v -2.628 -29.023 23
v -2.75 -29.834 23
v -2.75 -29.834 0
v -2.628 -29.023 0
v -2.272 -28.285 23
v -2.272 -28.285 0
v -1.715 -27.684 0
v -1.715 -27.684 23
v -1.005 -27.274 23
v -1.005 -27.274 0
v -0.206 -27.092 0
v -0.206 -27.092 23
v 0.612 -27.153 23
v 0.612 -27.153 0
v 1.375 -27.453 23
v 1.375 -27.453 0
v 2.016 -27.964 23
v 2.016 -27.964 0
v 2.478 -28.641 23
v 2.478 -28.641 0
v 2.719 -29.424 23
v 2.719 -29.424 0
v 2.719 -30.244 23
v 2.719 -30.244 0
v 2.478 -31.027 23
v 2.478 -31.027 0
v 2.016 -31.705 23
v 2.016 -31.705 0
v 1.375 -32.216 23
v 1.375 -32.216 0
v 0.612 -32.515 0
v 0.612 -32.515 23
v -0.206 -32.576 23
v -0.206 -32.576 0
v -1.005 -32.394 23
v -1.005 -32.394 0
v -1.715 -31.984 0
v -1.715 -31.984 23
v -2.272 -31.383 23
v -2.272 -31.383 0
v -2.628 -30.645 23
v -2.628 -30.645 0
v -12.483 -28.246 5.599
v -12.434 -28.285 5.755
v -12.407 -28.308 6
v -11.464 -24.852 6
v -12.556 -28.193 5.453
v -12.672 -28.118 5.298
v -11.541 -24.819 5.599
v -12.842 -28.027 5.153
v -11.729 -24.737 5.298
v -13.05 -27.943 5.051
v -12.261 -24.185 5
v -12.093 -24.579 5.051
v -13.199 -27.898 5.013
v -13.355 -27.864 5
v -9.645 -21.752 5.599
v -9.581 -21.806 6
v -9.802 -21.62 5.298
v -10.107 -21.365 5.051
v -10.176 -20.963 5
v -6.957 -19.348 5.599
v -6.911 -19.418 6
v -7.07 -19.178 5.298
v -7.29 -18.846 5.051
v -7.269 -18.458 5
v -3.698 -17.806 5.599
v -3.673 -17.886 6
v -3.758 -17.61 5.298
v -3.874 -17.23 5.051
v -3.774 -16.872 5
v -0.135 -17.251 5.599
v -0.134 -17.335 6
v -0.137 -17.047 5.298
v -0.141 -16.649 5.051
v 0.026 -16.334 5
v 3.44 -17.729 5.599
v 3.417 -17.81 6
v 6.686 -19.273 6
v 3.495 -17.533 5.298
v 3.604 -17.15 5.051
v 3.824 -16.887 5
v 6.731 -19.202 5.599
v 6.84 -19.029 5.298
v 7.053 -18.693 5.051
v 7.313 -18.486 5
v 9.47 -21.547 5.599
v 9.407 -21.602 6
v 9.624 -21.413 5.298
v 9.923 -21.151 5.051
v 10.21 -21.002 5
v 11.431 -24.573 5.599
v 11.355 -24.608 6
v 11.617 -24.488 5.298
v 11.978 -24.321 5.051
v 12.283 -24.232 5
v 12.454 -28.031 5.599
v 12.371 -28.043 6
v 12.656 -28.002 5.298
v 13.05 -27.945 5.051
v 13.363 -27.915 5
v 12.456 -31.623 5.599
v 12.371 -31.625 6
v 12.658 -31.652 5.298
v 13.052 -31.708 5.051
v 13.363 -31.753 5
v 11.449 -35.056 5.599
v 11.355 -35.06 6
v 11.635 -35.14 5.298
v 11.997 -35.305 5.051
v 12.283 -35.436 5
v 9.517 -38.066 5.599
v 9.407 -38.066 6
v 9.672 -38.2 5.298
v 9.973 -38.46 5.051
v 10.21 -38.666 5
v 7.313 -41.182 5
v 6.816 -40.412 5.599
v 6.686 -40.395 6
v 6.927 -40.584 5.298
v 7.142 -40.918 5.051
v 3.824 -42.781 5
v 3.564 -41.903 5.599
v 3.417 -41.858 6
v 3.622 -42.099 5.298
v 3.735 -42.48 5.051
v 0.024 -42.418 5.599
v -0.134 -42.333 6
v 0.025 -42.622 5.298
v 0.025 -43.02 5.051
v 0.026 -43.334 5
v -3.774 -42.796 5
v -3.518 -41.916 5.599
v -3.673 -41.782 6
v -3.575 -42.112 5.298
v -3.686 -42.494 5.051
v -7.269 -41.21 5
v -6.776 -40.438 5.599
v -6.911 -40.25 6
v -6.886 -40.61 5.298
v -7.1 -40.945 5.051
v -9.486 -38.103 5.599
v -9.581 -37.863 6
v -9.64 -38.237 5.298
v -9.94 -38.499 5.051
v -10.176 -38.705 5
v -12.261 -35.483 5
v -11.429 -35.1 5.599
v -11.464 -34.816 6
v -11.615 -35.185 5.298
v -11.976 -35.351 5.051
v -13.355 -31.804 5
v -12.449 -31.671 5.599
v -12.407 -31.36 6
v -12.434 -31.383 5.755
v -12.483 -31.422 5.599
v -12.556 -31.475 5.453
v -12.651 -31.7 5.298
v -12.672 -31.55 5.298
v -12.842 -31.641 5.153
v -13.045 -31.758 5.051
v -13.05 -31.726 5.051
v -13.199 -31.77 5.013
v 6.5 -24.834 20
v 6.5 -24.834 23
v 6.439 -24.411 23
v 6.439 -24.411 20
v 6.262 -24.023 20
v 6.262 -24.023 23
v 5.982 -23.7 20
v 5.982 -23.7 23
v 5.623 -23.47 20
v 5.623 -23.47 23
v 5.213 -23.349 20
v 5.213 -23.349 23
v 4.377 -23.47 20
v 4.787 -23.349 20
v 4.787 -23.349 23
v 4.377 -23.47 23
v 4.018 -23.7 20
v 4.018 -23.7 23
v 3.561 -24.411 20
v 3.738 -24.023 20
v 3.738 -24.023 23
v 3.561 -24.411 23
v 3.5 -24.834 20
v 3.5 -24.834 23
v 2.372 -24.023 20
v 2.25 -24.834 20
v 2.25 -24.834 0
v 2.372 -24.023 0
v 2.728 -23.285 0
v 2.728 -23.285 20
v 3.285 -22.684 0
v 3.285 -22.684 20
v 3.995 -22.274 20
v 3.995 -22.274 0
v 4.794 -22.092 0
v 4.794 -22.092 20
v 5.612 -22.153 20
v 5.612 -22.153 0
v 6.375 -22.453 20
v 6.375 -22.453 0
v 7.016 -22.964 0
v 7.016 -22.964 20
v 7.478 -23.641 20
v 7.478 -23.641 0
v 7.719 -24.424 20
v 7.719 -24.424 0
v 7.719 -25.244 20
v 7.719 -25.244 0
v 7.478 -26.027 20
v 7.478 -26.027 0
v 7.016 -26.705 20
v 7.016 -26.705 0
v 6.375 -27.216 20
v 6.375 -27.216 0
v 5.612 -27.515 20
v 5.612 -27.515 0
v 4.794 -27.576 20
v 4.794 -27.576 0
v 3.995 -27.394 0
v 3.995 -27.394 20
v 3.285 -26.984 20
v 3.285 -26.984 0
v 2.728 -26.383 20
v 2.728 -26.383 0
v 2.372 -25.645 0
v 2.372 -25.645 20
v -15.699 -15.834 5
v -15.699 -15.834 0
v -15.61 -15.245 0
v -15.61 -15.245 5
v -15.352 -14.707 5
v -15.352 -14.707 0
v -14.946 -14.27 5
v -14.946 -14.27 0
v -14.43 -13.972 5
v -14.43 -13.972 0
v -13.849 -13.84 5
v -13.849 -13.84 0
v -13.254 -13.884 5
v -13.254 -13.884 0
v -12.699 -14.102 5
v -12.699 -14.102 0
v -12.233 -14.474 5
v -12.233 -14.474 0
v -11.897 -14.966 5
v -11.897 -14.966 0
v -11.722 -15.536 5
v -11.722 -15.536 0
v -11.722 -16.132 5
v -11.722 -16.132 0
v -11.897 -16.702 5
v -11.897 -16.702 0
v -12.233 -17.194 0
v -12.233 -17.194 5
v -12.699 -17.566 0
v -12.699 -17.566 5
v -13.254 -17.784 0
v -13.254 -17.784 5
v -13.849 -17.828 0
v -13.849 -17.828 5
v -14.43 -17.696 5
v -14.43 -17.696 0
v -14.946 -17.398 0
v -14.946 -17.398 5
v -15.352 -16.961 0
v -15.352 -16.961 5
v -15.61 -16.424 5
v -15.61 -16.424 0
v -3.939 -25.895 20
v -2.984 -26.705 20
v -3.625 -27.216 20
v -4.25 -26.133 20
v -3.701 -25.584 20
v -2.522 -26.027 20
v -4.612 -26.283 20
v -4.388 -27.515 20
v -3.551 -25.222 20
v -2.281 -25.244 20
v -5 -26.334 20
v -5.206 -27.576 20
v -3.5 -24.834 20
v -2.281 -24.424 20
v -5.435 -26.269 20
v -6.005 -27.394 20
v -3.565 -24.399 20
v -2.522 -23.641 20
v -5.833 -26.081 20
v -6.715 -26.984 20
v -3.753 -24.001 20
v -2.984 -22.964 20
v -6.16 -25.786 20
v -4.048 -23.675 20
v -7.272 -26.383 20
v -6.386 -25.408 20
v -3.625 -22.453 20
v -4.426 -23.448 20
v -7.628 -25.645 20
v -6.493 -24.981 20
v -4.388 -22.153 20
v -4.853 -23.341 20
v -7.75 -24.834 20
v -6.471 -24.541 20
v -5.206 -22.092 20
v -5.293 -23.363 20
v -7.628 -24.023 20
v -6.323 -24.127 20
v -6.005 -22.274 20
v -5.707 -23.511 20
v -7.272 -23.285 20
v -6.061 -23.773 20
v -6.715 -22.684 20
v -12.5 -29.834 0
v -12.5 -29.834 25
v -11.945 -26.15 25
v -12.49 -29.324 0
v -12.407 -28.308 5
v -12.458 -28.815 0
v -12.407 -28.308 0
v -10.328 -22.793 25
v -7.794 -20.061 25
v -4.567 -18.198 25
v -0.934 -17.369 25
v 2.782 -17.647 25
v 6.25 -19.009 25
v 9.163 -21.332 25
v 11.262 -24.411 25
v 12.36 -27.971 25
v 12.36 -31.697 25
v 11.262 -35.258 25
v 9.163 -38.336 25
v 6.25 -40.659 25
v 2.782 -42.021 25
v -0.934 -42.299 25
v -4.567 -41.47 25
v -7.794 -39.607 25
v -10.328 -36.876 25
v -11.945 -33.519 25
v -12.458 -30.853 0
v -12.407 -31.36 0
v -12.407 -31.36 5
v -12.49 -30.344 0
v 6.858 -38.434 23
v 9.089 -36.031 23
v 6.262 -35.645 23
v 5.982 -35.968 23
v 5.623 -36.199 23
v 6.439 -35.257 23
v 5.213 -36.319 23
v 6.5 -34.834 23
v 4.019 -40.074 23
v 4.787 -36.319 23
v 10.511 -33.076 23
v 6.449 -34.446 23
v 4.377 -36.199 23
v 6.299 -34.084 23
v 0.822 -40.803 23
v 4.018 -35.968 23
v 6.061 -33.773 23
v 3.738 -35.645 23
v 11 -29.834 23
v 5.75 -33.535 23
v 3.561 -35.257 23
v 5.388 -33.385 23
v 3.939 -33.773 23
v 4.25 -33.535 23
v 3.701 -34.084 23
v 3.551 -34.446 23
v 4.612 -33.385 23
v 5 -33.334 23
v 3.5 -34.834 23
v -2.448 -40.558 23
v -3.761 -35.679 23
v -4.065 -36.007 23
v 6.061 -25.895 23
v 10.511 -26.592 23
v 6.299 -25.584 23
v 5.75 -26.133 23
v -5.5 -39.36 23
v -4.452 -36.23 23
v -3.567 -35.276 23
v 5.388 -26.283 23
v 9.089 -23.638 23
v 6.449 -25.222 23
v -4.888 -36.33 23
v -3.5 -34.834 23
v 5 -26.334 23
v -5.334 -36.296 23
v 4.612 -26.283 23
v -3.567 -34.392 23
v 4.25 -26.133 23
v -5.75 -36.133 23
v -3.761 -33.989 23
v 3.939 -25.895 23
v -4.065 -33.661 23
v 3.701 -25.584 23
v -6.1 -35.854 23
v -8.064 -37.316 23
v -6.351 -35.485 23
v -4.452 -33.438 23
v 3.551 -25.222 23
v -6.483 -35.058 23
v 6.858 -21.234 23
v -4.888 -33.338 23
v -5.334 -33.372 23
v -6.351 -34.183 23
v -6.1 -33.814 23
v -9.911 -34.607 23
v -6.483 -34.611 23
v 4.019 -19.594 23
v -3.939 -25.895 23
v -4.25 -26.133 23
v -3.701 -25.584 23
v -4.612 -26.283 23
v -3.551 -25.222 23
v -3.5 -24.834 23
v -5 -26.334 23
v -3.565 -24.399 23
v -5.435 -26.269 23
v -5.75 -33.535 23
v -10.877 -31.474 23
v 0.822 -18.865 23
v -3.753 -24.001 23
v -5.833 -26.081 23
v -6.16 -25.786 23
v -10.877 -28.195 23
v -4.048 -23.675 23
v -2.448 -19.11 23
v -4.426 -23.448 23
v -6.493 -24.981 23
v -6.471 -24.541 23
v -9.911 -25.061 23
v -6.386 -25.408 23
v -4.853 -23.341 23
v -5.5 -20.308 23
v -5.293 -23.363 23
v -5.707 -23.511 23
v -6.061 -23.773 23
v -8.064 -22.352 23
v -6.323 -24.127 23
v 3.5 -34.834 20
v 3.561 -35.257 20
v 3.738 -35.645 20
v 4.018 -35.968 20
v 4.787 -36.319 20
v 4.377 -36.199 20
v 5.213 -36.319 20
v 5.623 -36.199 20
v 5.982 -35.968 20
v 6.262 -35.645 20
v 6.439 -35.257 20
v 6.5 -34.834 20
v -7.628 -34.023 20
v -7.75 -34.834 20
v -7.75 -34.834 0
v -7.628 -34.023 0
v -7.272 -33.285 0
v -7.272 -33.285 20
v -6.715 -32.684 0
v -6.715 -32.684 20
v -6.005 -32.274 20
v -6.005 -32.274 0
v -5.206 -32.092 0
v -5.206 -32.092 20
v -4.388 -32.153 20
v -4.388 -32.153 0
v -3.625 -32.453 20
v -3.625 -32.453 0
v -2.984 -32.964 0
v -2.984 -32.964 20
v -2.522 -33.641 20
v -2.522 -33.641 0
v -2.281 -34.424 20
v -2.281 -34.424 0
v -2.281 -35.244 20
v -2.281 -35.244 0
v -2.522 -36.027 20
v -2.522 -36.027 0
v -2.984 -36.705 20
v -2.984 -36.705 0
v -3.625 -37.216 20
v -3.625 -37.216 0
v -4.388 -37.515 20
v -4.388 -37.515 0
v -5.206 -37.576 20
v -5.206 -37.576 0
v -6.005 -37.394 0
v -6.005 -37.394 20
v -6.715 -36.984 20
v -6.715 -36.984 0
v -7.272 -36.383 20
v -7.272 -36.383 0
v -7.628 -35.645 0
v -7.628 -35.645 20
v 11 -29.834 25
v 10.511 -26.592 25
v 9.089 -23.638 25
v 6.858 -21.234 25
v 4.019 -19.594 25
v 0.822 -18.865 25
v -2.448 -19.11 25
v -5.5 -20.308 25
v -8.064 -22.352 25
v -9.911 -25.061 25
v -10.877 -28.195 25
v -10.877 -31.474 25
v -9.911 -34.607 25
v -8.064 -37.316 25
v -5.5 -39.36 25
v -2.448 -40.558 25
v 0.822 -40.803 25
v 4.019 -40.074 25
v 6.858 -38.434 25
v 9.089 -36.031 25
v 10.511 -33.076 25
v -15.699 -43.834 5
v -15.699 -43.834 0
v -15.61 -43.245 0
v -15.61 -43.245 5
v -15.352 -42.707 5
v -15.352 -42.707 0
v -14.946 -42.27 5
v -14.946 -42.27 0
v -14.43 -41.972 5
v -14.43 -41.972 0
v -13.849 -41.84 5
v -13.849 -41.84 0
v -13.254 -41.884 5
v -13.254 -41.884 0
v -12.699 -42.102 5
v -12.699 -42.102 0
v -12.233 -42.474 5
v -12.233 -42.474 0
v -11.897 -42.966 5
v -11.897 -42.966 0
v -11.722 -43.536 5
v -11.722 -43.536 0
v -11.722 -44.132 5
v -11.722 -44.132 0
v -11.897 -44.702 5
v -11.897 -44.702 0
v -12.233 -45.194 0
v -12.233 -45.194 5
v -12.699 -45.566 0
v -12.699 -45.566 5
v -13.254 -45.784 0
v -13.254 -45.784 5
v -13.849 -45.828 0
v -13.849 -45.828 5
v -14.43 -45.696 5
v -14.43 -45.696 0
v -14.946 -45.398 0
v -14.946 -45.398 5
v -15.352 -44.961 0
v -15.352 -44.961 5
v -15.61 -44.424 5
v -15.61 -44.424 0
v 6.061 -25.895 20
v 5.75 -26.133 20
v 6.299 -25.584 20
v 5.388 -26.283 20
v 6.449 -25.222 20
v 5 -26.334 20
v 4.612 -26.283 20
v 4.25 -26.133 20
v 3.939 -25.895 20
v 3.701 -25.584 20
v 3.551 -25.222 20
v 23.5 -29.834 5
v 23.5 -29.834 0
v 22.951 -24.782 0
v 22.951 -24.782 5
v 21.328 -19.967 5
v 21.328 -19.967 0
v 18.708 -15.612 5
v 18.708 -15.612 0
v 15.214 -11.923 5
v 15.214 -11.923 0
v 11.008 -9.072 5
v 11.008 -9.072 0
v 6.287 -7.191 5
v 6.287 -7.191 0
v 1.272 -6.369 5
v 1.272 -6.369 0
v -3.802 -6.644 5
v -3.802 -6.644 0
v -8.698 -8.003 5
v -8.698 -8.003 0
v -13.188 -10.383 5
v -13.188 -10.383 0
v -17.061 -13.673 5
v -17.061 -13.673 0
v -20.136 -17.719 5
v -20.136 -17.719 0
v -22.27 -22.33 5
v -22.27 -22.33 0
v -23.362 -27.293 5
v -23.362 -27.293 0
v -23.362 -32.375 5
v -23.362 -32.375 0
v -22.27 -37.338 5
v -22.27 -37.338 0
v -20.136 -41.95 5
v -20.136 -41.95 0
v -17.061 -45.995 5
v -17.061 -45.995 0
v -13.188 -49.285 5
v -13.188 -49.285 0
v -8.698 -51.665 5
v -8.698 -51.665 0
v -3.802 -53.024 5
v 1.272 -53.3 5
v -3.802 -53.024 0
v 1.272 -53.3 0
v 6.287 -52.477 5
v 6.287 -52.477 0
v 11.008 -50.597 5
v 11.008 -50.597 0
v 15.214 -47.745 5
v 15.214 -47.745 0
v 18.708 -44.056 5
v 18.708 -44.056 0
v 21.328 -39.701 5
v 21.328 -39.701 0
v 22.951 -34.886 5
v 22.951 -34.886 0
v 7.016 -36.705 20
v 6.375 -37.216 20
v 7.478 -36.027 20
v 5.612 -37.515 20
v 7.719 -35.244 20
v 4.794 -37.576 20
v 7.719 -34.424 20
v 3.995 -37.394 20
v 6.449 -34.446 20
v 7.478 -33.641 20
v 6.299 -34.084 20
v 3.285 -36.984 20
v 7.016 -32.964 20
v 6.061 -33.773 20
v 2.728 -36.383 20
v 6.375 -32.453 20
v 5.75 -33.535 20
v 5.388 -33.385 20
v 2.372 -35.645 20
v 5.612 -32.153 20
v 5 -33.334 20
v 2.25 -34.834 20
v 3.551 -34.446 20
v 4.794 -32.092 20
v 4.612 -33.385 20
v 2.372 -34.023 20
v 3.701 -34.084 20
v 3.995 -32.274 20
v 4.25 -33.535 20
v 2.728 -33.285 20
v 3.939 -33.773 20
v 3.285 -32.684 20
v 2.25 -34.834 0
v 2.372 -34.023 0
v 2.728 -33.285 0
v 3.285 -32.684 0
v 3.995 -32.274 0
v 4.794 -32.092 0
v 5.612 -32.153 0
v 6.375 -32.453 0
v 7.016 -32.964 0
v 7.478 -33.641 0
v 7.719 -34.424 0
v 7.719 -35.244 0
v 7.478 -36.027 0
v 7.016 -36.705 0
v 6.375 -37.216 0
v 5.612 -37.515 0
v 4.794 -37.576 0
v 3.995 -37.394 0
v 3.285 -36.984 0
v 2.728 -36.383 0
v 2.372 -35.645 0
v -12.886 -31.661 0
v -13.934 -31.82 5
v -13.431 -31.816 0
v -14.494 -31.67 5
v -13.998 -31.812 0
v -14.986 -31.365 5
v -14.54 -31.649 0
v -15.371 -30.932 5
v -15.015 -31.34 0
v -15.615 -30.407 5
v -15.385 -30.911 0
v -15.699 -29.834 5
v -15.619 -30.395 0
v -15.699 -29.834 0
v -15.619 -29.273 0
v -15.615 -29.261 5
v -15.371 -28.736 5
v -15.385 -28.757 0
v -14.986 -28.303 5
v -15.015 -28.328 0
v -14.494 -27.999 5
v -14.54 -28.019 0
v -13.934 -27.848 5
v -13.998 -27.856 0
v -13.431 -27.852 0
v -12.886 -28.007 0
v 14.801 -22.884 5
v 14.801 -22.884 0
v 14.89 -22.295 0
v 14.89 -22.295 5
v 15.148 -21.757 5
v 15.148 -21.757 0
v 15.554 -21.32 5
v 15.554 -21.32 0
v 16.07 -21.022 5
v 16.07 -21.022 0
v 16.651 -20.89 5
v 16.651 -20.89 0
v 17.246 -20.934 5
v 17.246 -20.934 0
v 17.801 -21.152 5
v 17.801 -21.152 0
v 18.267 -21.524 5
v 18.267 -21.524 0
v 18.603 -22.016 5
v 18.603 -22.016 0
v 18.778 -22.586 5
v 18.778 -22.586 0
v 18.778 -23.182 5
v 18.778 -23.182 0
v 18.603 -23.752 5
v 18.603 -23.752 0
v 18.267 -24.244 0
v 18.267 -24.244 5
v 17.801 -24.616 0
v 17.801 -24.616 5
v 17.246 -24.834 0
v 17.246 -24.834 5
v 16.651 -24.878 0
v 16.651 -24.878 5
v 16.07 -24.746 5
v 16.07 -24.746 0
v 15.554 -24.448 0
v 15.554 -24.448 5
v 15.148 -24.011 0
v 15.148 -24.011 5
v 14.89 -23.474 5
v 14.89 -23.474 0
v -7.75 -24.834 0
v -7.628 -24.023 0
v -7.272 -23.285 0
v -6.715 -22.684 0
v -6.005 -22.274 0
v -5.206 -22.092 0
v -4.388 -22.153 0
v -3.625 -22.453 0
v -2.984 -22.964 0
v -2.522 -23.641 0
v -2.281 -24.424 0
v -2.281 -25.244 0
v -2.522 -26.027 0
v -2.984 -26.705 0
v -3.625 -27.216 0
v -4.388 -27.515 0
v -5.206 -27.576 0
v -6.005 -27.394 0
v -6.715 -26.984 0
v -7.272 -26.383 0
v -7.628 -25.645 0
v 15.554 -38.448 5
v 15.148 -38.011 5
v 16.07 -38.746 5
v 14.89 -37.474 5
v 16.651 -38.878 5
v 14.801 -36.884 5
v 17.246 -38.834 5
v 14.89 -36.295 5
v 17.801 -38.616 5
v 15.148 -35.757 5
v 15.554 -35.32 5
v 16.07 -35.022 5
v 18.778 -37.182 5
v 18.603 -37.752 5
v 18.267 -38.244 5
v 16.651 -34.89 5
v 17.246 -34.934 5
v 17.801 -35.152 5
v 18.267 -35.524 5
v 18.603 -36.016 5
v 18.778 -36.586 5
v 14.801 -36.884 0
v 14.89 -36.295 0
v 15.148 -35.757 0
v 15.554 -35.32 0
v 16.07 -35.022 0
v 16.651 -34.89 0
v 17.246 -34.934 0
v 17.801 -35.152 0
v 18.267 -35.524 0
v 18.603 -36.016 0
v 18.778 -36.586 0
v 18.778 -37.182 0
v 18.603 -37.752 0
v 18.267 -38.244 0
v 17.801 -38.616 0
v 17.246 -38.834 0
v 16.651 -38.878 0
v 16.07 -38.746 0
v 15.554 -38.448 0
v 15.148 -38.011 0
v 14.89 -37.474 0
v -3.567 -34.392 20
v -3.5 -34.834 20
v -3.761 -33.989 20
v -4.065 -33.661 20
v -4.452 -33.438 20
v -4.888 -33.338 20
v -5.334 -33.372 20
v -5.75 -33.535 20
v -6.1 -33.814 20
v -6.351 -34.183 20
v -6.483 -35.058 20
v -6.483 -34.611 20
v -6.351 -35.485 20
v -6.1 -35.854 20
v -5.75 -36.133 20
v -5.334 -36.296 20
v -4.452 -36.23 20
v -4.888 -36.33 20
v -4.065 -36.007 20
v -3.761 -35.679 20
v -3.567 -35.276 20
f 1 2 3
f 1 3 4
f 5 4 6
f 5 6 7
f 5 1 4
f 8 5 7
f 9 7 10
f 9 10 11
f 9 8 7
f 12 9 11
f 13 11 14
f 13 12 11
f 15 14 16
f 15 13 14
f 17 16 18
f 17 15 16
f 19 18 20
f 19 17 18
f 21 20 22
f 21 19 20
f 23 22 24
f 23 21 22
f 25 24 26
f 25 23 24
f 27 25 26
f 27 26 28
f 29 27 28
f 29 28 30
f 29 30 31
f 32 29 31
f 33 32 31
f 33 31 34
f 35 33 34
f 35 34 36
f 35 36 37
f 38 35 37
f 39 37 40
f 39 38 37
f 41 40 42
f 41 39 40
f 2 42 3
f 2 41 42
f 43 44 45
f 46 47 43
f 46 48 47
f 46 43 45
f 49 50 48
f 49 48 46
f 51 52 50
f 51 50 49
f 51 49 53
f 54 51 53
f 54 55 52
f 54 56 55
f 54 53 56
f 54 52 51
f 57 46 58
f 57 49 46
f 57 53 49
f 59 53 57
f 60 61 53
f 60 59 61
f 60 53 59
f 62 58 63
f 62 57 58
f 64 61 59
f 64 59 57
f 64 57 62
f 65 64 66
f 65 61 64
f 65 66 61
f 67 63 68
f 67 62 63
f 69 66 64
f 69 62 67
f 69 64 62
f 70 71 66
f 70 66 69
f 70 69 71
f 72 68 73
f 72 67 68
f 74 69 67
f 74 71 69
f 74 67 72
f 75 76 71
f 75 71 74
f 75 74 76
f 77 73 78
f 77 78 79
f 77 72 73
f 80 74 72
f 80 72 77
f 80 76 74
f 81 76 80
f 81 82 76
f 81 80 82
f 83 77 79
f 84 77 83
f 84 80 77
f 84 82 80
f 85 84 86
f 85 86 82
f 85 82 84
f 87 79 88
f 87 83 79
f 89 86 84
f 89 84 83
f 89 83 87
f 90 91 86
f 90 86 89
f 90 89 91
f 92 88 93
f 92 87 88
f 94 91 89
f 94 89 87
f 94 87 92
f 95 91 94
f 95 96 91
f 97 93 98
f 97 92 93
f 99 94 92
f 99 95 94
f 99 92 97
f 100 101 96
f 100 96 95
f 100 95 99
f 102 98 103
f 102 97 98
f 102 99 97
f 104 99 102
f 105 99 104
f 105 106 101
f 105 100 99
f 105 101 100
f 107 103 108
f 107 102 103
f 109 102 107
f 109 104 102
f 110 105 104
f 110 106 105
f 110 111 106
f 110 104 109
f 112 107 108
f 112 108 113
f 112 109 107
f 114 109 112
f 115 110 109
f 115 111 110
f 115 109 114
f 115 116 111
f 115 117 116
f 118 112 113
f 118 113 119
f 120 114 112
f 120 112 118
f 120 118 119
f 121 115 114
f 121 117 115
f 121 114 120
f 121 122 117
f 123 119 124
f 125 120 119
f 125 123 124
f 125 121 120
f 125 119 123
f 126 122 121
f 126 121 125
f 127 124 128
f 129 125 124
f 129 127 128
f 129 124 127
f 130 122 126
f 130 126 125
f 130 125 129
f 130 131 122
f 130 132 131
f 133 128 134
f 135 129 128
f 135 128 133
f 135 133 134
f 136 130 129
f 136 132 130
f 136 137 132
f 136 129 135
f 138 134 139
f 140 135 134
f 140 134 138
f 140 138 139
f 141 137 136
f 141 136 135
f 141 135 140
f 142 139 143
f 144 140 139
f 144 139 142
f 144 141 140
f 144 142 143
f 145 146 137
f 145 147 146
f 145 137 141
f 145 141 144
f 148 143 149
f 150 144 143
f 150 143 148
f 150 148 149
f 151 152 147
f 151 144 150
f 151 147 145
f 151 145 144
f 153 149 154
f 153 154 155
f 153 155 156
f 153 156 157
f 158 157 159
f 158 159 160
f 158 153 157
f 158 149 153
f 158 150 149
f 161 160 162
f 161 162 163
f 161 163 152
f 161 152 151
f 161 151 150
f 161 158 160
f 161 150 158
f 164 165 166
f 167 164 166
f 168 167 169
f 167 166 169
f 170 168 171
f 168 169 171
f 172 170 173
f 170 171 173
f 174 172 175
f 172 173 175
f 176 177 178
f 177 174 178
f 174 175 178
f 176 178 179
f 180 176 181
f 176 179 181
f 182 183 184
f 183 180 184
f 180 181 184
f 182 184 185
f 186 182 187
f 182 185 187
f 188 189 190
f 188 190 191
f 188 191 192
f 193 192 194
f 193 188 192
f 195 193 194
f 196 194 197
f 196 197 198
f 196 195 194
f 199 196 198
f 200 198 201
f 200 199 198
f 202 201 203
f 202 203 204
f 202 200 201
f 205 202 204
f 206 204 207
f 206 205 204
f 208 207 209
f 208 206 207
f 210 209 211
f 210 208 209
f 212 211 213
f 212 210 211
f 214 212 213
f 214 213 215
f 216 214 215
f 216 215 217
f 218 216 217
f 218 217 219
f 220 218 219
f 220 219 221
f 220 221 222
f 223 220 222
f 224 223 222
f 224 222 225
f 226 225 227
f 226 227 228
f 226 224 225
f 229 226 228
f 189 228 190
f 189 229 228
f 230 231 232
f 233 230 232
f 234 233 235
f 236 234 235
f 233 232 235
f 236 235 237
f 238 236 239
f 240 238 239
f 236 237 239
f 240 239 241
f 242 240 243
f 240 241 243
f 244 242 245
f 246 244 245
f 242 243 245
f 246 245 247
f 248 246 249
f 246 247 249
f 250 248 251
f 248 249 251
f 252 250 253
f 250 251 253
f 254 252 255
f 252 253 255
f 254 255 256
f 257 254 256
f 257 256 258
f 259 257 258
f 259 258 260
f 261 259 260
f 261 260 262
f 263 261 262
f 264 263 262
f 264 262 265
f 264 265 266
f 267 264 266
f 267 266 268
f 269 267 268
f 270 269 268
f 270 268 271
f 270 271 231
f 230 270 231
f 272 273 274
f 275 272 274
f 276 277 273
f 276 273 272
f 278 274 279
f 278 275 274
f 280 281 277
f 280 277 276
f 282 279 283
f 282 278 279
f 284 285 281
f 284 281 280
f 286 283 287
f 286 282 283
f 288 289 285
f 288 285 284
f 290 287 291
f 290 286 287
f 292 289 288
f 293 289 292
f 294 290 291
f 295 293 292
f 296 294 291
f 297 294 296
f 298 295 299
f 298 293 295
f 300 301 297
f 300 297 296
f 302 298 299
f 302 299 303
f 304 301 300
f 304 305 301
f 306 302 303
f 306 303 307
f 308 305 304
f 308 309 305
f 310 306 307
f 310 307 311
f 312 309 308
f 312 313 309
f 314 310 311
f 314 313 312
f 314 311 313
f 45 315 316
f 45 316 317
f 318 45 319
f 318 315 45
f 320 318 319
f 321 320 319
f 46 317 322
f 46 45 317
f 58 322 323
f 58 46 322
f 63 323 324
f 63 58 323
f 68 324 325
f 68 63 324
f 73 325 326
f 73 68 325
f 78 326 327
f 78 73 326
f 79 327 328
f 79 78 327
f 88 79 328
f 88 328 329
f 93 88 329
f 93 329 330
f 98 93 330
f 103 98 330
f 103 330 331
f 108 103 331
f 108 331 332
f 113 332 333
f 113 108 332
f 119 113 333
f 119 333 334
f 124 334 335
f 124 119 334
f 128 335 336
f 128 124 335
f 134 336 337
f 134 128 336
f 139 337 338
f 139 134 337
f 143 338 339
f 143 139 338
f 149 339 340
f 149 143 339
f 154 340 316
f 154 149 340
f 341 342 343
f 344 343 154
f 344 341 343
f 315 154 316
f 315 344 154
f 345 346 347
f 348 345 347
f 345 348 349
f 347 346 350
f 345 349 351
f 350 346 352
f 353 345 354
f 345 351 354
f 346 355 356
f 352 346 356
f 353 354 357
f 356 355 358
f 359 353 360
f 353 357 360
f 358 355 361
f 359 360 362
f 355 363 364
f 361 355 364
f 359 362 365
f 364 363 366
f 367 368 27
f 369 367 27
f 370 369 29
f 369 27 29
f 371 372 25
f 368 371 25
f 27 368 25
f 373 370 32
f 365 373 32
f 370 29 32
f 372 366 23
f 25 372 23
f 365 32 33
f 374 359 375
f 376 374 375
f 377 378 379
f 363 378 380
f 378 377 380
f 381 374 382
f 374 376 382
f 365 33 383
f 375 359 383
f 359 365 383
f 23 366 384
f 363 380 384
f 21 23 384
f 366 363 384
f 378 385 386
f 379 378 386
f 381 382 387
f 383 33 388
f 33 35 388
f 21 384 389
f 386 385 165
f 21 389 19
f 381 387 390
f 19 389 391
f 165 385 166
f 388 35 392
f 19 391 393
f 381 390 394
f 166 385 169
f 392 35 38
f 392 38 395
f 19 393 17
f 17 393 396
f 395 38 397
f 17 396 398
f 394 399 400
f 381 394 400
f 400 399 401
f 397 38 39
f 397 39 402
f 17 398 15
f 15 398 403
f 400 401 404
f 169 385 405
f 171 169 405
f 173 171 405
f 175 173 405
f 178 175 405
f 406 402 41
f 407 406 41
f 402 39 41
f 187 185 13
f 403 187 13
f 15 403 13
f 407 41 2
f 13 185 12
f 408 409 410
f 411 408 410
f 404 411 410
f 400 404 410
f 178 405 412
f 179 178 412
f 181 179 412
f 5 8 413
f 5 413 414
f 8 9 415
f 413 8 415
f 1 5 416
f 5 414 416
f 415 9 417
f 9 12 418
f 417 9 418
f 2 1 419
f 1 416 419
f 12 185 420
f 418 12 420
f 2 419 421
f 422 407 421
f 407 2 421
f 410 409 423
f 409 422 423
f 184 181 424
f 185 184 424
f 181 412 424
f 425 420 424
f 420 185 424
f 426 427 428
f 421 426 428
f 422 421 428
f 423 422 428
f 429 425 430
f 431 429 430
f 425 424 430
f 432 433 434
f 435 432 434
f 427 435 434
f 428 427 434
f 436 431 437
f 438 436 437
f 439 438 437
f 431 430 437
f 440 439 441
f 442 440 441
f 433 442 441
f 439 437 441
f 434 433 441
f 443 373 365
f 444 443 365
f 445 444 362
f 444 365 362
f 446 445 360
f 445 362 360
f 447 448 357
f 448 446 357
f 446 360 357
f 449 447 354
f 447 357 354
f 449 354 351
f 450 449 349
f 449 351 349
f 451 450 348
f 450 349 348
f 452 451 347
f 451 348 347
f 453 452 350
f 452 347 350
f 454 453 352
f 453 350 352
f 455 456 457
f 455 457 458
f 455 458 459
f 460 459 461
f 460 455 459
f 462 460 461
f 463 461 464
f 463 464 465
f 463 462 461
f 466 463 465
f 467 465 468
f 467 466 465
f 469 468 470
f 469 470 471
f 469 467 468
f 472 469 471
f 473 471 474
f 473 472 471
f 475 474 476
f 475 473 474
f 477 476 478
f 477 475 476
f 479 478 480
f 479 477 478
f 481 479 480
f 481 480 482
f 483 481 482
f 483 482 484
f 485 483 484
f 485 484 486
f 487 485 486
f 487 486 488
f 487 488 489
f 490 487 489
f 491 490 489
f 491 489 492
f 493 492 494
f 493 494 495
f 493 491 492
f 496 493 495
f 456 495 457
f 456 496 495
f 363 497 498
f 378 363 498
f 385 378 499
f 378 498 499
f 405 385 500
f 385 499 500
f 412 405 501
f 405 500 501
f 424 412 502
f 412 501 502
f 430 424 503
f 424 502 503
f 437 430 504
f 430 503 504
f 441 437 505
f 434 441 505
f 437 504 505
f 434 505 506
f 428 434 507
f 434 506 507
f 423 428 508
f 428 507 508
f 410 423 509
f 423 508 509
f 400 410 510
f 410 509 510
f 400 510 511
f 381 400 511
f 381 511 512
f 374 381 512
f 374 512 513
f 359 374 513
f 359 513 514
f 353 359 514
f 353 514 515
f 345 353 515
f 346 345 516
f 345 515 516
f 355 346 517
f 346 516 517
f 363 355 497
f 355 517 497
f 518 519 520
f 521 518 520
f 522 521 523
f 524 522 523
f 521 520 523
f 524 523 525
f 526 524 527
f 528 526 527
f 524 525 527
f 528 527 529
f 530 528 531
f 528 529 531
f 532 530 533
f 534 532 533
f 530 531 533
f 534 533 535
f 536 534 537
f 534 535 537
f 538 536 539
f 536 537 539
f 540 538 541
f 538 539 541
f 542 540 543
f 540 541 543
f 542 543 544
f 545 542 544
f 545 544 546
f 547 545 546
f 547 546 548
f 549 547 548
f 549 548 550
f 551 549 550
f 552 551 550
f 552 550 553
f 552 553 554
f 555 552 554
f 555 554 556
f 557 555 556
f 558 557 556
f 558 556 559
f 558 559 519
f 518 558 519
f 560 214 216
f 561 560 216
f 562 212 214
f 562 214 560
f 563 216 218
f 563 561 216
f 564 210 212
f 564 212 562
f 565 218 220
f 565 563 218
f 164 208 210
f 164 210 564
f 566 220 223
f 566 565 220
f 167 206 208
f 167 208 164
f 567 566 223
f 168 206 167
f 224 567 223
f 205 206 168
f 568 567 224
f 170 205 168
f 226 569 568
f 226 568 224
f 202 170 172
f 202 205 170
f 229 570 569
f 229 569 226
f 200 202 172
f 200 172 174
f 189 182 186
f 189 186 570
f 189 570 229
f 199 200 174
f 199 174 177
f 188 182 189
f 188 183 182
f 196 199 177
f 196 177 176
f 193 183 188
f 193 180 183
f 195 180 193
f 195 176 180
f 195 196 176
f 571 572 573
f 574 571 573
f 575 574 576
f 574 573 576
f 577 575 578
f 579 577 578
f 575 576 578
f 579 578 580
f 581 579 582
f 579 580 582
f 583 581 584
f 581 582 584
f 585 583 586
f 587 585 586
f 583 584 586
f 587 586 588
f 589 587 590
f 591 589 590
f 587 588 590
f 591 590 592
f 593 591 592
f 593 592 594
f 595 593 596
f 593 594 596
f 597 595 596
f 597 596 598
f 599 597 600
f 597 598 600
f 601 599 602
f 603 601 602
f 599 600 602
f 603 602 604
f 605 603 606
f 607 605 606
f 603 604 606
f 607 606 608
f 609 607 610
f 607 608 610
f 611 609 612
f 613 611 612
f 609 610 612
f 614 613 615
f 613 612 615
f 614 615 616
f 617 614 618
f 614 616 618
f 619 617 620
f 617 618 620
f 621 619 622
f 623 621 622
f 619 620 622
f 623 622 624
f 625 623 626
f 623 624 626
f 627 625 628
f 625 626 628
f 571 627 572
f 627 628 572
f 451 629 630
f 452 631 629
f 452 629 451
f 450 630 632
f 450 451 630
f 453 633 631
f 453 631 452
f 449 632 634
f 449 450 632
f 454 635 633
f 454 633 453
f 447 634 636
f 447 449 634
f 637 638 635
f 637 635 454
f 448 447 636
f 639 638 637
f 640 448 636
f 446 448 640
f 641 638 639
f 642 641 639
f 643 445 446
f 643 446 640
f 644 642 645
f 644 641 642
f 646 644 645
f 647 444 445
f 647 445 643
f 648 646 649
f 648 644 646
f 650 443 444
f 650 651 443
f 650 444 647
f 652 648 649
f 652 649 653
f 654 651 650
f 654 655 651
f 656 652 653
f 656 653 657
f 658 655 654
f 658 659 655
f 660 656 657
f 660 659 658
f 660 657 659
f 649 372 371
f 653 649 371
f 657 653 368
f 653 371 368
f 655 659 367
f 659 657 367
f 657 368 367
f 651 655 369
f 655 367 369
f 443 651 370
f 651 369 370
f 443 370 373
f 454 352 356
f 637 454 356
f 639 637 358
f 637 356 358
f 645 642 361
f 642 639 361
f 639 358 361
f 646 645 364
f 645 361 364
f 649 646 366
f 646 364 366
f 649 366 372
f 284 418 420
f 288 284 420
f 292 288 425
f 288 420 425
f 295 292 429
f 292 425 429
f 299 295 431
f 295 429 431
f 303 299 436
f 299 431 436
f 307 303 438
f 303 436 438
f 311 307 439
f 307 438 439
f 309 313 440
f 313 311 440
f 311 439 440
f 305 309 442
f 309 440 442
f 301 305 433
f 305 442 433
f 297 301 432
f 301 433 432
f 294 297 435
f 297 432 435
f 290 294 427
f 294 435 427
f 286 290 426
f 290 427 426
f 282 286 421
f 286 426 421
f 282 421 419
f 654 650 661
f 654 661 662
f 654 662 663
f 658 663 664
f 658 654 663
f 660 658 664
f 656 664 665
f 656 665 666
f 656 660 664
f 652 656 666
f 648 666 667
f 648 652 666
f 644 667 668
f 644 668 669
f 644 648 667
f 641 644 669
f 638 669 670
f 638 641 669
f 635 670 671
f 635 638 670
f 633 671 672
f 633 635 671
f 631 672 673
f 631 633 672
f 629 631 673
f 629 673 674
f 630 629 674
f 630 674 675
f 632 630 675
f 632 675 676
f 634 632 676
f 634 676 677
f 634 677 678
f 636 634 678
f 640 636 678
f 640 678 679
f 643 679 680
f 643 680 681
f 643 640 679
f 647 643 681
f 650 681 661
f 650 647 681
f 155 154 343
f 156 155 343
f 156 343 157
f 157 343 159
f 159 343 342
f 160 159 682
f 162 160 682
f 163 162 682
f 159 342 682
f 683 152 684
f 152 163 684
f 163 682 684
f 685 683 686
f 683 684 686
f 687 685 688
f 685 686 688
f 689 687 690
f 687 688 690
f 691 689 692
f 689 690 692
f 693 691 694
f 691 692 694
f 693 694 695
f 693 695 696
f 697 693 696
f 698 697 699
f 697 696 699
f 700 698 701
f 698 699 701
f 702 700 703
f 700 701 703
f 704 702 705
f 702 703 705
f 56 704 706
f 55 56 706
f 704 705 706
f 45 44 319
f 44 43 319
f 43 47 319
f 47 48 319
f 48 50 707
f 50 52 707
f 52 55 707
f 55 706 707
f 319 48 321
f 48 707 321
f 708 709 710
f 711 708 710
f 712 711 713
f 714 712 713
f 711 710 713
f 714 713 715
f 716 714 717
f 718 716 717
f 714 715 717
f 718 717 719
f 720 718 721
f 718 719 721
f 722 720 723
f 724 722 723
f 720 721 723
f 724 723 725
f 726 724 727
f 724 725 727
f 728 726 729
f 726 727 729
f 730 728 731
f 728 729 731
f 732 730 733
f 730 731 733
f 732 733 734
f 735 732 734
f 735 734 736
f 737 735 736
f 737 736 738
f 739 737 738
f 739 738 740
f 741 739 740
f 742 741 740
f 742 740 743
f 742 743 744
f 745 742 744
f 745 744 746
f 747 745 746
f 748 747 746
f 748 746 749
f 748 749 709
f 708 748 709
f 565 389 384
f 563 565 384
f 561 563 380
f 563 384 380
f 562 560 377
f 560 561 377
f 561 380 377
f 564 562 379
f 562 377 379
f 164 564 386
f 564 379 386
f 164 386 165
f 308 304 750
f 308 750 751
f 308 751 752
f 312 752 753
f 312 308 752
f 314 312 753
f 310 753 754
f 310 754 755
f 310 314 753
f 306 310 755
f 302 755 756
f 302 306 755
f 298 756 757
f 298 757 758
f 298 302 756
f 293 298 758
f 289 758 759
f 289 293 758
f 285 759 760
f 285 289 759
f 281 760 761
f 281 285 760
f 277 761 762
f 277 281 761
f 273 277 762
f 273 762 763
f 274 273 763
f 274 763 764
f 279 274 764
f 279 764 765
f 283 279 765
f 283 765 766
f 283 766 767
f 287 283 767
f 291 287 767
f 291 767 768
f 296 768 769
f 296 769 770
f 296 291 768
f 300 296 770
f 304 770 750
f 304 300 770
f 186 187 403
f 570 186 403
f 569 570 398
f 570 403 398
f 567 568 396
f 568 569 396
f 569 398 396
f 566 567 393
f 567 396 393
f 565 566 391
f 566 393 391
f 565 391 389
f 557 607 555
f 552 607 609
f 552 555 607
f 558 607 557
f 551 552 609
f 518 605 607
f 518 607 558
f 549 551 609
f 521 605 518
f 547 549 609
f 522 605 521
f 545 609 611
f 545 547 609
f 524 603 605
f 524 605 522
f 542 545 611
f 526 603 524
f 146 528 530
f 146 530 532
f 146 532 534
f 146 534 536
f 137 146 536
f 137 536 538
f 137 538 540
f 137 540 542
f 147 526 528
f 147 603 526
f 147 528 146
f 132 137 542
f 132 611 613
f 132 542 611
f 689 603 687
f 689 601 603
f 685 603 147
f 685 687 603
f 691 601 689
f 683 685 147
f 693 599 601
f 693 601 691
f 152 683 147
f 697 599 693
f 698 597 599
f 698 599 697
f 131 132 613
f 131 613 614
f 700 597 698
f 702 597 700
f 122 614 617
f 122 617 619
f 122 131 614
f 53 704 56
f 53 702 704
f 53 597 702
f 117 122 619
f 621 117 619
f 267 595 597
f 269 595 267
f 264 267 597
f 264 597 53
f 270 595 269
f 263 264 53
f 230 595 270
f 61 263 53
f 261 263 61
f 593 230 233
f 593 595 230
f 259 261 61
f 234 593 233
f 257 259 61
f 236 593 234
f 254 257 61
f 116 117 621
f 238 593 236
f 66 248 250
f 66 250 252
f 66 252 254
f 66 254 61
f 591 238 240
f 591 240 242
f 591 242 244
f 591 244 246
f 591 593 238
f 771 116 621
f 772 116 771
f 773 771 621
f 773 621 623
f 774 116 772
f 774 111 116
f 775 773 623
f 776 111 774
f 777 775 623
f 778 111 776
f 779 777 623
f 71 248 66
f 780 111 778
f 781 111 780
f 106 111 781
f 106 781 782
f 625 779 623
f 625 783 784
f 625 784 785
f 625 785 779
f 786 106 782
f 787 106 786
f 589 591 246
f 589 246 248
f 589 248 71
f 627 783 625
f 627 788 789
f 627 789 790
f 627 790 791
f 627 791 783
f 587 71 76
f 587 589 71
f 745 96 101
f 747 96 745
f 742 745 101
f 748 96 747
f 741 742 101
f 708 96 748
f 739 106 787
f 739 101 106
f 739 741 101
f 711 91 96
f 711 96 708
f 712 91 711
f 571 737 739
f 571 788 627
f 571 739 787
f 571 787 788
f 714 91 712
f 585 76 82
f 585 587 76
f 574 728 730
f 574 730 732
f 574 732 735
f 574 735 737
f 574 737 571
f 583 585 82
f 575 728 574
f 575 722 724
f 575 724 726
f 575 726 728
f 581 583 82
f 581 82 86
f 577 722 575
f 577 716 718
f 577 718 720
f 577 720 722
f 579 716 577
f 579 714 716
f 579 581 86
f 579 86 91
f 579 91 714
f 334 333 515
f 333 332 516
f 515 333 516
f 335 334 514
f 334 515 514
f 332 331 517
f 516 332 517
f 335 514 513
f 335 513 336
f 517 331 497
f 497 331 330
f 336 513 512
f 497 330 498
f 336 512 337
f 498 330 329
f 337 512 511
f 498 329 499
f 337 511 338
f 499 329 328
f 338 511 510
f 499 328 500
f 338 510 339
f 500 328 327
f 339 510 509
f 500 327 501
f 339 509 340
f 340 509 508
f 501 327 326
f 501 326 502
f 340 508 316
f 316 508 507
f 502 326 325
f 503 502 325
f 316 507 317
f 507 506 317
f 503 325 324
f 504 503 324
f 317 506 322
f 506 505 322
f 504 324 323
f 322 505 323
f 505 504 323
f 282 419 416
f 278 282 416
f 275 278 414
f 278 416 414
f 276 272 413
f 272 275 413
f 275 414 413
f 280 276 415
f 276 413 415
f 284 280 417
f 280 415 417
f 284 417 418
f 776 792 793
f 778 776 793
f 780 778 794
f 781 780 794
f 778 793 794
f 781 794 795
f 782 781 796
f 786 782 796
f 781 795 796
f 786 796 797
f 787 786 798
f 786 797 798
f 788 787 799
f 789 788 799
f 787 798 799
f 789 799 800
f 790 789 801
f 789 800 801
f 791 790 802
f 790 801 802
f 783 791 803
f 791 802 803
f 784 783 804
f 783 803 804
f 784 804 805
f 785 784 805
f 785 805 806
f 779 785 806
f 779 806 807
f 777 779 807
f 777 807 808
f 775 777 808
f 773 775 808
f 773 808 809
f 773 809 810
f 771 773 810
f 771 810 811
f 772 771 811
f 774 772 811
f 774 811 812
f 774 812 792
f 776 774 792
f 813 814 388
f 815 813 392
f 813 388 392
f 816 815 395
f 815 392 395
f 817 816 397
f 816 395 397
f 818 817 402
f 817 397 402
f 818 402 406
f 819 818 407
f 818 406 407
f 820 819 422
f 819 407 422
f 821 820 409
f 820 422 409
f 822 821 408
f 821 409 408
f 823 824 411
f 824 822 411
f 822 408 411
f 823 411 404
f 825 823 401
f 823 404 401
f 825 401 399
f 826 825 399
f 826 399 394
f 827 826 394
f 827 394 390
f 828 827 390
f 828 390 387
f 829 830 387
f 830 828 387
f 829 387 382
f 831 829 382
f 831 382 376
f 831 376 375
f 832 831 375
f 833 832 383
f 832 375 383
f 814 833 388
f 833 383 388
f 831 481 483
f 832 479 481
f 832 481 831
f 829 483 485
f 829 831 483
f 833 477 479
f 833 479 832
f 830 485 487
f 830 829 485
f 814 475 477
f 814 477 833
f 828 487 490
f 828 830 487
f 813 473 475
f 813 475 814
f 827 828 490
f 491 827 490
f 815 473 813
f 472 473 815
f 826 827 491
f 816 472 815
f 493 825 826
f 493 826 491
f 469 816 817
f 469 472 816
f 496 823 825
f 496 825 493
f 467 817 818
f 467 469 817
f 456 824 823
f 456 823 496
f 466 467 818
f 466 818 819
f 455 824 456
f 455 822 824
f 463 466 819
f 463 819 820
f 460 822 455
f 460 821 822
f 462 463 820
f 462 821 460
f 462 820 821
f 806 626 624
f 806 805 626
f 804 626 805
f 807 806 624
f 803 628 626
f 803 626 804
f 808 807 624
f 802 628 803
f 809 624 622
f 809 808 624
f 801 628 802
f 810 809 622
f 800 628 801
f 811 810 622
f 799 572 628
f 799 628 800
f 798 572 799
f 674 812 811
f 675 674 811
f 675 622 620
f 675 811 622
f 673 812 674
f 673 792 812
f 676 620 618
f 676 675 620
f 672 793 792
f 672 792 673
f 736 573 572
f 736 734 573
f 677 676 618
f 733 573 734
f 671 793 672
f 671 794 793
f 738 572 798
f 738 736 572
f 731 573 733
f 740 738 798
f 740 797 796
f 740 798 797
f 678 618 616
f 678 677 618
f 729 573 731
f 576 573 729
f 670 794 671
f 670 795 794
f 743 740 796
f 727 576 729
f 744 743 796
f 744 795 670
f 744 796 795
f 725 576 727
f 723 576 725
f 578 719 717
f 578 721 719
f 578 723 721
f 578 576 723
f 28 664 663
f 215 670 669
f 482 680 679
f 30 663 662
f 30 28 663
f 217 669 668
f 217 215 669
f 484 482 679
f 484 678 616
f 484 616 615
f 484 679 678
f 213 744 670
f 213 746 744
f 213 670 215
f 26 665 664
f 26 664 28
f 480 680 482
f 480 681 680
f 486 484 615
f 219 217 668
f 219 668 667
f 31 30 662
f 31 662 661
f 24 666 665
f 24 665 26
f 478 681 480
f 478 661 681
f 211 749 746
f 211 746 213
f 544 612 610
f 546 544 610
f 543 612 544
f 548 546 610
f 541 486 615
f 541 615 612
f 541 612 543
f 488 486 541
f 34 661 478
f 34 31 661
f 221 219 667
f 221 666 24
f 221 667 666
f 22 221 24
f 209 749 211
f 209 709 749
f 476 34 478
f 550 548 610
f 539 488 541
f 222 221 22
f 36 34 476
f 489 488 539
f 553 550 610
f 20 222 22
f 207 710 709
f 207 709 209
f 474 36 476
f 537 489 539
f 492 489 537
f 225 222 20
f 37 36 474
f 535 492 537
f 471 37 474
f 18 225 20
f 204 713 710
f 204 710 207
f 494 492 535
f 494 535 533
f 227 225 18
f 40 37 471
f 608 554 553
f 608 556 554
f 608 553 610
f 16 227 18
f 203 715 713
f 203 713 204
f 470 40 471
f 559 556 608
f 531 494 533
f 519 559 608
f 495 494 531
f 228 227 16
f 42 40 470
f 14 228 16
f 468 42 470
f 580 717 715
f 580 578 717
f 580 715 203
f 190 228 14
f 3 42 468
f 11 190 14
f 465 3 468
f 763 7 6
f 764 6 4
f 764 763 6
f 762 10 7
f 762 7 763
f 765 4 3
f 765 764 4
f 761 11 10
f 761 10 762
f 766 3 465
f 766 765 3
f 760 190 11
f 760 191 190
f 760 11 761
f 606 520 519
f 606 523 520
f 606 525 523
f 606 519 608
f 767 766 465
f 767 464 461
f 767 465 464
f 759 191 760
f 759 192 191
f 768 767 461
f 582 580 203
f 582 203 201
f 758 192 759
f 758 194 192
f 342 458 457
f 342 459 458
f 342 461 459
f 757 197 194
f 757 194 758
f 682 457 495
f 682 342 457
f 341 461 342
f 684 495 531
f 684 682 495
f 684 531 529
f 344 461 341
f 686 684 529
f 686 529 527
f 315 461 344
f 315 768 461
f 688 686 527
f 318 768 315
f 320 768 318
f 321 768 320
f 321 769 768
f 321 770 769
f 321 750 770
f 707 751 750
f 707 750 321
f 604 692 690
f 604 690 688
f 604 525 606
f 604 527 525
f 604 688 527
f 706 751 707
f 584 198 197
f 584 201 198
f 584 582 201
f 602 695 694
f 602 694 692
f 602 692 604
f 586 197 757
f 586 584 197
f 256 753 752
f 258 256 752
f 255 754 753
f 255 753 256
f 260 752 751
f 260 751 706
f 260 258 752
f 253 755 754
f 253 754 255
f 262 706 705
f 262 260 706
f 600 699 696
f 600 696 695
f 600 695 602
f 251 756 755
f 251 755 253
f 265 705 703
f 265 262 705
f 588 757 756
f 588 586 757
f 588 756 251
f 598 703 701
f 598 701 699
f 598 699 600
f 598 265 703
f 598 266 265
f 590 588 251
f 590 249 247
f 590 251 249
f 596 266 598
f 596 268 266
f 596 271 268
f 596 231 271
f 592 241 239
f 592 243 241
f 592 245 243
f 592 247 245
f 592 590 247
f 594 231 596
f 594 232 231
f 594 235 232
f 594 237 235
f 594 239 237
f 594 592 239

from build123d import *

# Parameters (mm, degrees)
SKETCH_1_R          = 23.5
EXTRUDE_1_DEPTH     = 5
SKETCH_2_R          = 2
CUT_EXTRUDE_1_DEPTH = 59.495923488
SKETCH_3_R          = 12.5
EXTRUDE_3_DEPTH     = 25
SKETCH_4_R          = 4
SKETCH_4_R_2        = 1.5
CUT_EXTRUDE_2_DEPTH = 64.41745079
SKETCH_5_R          = 11
CUT_EXTRUDE_3_DEPTH = 2
CUT_EXTRUDE_START   = -20
SKETCH_6_R          = 2.75
SKETCH_6_R_2        = 1.5
CUT_EXTRUDE_5_DEPTH = 20
EXTRUDE_START       = -23
SKETCH_7_R          = 4
SKETCH_7_R_2        = 2.75
EXTRUDE_4_DEPTH     = 23
FILLET_1_R          = 1


with BuildPart() as part:
    # 草图1 → 凸台-拉伸1 (new body)
    with BuildSketch(Plane.XY):
        with Locations((0, -29.834070393)):
            Circle(SKETCH_1_R)
    extrude(amount=EXTRUDE_1_DEPTH)

    # 草图2 → 切除-拉伸1 (cut, through all)
    with BuildSketch(Plane(origin=(0, 0, 0), x_dir=(-1, 0, 0), z_dir=(0, 0, -1))):
        with Locations((13.699273048, -15.834070393)):
            Circle(SKETCH_2_R)
        with Locations((13.699273048, -43.834070393)):
            Circle(SKETCH_2_R)
        with Locations((-16.800726952, -22.884070393)):
            Circle(SKETCH_2_R)
        with Locations((-16.800726952, -36.884070393)):
            Circle(SKETCH_2_R)
        with Locations((13.699273048, -29.834070393)):
            Circle(SKETCH_2_R)
    extrude(amount=-CUT_EXTRUDE_1_DEPTH, mode=Mode.SUBTRACT)

    # 草图3 → 凸台-拉伸3 (add)
    with BuildSketch(Plane(origin=(0, 0, 0), x_dir=(-1, 0, 0), z_dir=(0, 0, -1))):
        with Locations((0, -29.834070393)):
            Circle(SKETCH_3_R)
    extrude(amount=-EXTRUDE_3_DEPTH)

    # 草图4 → 切除-拉伸2 (cut, through all)
    with BuildSketch(Plane.XY.offset(25)):
        with BuildLine():
            ThreePointArc((-3.5, -24.834070393), (-6.060660172, -23.773410221), (-5, -26.334070393))
            Line((-5, -26.334070393), (-5, -24.834070393))
            Line((-5, -24.834070393), (-3.5, -24.834070393))
        make_face()
        with BuildLine():
            Line((-5, -24.834070393), (-5, -26.334070393))
            ThreePointArc((-5, -26.334070393), (-3.939339828, -25.894730565), (-3.5, -24.834070393))
            Line((-3.5, -24.834070393), (-5, -24.834070393))
        make_face()
        with BuildLine():
            ThreePointArc((3.5, -24.834070393), (3.939339828, -25.894730565), (5, -26.334070393))
            Line((5, -26.334070393), (5, -24.834070393))
            Line((5, -24.834070393), (3.5, -24.834070393))
        make_face()
        with BuildLine():
            Line((5, -24.834070393), (5, -26.334070393))
            ThreePointArc((5, -26.334070393), (6.060660172, -25.894730565), (6.5, -24.834070393))
            ThreePointArc((6.5, -24.834070393), (5, -23.334070393), (3.5, -24.834070393))
            Line((3.5, -24.834070393), (5, -24.834070393))
        make_face()
        with BuildLine():
            ThreePointArc((5, -33.334070393), (3.939339828, -33.773410221), (3.5, -34.834070393))
            Line((3.5, -34.834070393), (5, -34.834070393))
            Line((5, -34.834070393), (5, -33.334070393))
        make_face()
        with BuildLine():
            Line((5, -34.834070393), (3.5, -34.834070393))
            ThreePointArc((3.5, -34.834070393), (5, -36.334070393), (6.5, -34.834070393))
            ThreePointArc((6.5, -34.834070393), (6.060660172, -33.773410221), (5, -33.334070393))
            Line((5, -33.334070393), (5, -34.834070393))
        make_face()
        with Locations((0, -29.834070393)):
            Circle(SKETCH_4_R)
        with Locations((-5, -34.834070393)):
            Circle(SKETCH_4_R_2)
    extrude(amount=-CUT_EXTRUDE_2_DEPTH, mode=Mode.SUBTRACT)

    # 草图5 → 切除-拉伸3 (cut)
    with BuildSketch(Plane.XY.offset(25)):
        with Locations((0, -29.834070393)):
            Circle(SKETCH_5_R)
    extrude(amount=-CUT_EXTRUDE_3_DEPTH, mode=Mode.SUBTRACT)

    # 草图6 → 切除-拉伸5 (cut)
    # profile 1 of 4: a face of its own
    with BuildSketch(Plane(origin=(0, 0, 0), x_dir=(-1, 0, 0), z_dir=(0, 0, -1)).offset(CUT_EXTRUDE_START)):
        with Locations((-5, -24.834070393)):
            Circle(SKETCH_6_R)
        with Locations(Location((-5, -24.834070393, 0), (0, 0, 180))):
            Circle(SKETCH_6_R_2, mode=Mode.SUBTRACT)
    # profile 2 of 4: a face of its own
    with BuildSketch(Plane(origin=(0, 0, 0), x_dir=(-1, 0, 0), z_dir=(0, 0, -1)).offset(CUT_EXTRUDE_START)):
        with Locations((5, -24.834070393)):
            Circle(SKETCH_6_R)
        with Locations(Location((5, -24.834070393, 0), (0, 0, 180))):
            Circle(SKETCH_6_R_2, mode=Mode.SUBTRACT)
    # profile 3 of 4: a face of its own
    with BuildSketch(Plane(origin=(0, 0, 0), x_dir=(-1, 0, 0), z_dir=(0, 0, -1)).offset(CUT_EXTRUDE_START)):
        with Locations((-5, -34.834070393)):
            Circle(SKETCH_6_R)
        with Locations(Location((-5, -34.834070393, 0), (0, 0, 180))):
            Circle(SKETCH_6_R_2, mode=Mode.SUBTRACT)
    # profile 4 of 4: a face of its own
    with BuildSketch(Plane(origin=(0, 0, 0), x_dir=(-1, 0, 0), z_dir=(0, 0, -1)).offset(CUT_EXTRUDE_START)):
        with Locations((5, -34.834070393)):
            Circle(SKETCH_6_R)
        with Locations(Location((5, -34.834070393, 0), (0, 0, 180))):
            Circle(SKETCH_6_R_2, mode=Mode.SUBTRACT)
    extrude(amount=CUT_EXTRUDE_5_DEPTH, mode=Mode.SUBTRACT)

    # 草图7 → 凸台-拉伸4 (add)
    with BuildSketch(Plane(origin=(0, 0, 0), x_dir=(-1, 0, 0), z_dir=(0, 0, -1)).offset(EXTRUDE_START)):
        with Locations((0, -29.834070393)):
            Circle(SKETCH_7_R)
        with Locations((0, -29.834070393)):
            Circle(SKETCH_7_R_2, mode=Mode.SUBTRACT)
    extrude(amount=EXTRUDE_4_DEPTH)

    # 圆角1
    fillet_1_edges = [part.edges().sort_by_distance(p)[0] for p in [
        (12.5, -29.834070393, 5),
    ]]
    fillet(fillet_1_edges, radius=FILLET_1_R)


solid = part.part
